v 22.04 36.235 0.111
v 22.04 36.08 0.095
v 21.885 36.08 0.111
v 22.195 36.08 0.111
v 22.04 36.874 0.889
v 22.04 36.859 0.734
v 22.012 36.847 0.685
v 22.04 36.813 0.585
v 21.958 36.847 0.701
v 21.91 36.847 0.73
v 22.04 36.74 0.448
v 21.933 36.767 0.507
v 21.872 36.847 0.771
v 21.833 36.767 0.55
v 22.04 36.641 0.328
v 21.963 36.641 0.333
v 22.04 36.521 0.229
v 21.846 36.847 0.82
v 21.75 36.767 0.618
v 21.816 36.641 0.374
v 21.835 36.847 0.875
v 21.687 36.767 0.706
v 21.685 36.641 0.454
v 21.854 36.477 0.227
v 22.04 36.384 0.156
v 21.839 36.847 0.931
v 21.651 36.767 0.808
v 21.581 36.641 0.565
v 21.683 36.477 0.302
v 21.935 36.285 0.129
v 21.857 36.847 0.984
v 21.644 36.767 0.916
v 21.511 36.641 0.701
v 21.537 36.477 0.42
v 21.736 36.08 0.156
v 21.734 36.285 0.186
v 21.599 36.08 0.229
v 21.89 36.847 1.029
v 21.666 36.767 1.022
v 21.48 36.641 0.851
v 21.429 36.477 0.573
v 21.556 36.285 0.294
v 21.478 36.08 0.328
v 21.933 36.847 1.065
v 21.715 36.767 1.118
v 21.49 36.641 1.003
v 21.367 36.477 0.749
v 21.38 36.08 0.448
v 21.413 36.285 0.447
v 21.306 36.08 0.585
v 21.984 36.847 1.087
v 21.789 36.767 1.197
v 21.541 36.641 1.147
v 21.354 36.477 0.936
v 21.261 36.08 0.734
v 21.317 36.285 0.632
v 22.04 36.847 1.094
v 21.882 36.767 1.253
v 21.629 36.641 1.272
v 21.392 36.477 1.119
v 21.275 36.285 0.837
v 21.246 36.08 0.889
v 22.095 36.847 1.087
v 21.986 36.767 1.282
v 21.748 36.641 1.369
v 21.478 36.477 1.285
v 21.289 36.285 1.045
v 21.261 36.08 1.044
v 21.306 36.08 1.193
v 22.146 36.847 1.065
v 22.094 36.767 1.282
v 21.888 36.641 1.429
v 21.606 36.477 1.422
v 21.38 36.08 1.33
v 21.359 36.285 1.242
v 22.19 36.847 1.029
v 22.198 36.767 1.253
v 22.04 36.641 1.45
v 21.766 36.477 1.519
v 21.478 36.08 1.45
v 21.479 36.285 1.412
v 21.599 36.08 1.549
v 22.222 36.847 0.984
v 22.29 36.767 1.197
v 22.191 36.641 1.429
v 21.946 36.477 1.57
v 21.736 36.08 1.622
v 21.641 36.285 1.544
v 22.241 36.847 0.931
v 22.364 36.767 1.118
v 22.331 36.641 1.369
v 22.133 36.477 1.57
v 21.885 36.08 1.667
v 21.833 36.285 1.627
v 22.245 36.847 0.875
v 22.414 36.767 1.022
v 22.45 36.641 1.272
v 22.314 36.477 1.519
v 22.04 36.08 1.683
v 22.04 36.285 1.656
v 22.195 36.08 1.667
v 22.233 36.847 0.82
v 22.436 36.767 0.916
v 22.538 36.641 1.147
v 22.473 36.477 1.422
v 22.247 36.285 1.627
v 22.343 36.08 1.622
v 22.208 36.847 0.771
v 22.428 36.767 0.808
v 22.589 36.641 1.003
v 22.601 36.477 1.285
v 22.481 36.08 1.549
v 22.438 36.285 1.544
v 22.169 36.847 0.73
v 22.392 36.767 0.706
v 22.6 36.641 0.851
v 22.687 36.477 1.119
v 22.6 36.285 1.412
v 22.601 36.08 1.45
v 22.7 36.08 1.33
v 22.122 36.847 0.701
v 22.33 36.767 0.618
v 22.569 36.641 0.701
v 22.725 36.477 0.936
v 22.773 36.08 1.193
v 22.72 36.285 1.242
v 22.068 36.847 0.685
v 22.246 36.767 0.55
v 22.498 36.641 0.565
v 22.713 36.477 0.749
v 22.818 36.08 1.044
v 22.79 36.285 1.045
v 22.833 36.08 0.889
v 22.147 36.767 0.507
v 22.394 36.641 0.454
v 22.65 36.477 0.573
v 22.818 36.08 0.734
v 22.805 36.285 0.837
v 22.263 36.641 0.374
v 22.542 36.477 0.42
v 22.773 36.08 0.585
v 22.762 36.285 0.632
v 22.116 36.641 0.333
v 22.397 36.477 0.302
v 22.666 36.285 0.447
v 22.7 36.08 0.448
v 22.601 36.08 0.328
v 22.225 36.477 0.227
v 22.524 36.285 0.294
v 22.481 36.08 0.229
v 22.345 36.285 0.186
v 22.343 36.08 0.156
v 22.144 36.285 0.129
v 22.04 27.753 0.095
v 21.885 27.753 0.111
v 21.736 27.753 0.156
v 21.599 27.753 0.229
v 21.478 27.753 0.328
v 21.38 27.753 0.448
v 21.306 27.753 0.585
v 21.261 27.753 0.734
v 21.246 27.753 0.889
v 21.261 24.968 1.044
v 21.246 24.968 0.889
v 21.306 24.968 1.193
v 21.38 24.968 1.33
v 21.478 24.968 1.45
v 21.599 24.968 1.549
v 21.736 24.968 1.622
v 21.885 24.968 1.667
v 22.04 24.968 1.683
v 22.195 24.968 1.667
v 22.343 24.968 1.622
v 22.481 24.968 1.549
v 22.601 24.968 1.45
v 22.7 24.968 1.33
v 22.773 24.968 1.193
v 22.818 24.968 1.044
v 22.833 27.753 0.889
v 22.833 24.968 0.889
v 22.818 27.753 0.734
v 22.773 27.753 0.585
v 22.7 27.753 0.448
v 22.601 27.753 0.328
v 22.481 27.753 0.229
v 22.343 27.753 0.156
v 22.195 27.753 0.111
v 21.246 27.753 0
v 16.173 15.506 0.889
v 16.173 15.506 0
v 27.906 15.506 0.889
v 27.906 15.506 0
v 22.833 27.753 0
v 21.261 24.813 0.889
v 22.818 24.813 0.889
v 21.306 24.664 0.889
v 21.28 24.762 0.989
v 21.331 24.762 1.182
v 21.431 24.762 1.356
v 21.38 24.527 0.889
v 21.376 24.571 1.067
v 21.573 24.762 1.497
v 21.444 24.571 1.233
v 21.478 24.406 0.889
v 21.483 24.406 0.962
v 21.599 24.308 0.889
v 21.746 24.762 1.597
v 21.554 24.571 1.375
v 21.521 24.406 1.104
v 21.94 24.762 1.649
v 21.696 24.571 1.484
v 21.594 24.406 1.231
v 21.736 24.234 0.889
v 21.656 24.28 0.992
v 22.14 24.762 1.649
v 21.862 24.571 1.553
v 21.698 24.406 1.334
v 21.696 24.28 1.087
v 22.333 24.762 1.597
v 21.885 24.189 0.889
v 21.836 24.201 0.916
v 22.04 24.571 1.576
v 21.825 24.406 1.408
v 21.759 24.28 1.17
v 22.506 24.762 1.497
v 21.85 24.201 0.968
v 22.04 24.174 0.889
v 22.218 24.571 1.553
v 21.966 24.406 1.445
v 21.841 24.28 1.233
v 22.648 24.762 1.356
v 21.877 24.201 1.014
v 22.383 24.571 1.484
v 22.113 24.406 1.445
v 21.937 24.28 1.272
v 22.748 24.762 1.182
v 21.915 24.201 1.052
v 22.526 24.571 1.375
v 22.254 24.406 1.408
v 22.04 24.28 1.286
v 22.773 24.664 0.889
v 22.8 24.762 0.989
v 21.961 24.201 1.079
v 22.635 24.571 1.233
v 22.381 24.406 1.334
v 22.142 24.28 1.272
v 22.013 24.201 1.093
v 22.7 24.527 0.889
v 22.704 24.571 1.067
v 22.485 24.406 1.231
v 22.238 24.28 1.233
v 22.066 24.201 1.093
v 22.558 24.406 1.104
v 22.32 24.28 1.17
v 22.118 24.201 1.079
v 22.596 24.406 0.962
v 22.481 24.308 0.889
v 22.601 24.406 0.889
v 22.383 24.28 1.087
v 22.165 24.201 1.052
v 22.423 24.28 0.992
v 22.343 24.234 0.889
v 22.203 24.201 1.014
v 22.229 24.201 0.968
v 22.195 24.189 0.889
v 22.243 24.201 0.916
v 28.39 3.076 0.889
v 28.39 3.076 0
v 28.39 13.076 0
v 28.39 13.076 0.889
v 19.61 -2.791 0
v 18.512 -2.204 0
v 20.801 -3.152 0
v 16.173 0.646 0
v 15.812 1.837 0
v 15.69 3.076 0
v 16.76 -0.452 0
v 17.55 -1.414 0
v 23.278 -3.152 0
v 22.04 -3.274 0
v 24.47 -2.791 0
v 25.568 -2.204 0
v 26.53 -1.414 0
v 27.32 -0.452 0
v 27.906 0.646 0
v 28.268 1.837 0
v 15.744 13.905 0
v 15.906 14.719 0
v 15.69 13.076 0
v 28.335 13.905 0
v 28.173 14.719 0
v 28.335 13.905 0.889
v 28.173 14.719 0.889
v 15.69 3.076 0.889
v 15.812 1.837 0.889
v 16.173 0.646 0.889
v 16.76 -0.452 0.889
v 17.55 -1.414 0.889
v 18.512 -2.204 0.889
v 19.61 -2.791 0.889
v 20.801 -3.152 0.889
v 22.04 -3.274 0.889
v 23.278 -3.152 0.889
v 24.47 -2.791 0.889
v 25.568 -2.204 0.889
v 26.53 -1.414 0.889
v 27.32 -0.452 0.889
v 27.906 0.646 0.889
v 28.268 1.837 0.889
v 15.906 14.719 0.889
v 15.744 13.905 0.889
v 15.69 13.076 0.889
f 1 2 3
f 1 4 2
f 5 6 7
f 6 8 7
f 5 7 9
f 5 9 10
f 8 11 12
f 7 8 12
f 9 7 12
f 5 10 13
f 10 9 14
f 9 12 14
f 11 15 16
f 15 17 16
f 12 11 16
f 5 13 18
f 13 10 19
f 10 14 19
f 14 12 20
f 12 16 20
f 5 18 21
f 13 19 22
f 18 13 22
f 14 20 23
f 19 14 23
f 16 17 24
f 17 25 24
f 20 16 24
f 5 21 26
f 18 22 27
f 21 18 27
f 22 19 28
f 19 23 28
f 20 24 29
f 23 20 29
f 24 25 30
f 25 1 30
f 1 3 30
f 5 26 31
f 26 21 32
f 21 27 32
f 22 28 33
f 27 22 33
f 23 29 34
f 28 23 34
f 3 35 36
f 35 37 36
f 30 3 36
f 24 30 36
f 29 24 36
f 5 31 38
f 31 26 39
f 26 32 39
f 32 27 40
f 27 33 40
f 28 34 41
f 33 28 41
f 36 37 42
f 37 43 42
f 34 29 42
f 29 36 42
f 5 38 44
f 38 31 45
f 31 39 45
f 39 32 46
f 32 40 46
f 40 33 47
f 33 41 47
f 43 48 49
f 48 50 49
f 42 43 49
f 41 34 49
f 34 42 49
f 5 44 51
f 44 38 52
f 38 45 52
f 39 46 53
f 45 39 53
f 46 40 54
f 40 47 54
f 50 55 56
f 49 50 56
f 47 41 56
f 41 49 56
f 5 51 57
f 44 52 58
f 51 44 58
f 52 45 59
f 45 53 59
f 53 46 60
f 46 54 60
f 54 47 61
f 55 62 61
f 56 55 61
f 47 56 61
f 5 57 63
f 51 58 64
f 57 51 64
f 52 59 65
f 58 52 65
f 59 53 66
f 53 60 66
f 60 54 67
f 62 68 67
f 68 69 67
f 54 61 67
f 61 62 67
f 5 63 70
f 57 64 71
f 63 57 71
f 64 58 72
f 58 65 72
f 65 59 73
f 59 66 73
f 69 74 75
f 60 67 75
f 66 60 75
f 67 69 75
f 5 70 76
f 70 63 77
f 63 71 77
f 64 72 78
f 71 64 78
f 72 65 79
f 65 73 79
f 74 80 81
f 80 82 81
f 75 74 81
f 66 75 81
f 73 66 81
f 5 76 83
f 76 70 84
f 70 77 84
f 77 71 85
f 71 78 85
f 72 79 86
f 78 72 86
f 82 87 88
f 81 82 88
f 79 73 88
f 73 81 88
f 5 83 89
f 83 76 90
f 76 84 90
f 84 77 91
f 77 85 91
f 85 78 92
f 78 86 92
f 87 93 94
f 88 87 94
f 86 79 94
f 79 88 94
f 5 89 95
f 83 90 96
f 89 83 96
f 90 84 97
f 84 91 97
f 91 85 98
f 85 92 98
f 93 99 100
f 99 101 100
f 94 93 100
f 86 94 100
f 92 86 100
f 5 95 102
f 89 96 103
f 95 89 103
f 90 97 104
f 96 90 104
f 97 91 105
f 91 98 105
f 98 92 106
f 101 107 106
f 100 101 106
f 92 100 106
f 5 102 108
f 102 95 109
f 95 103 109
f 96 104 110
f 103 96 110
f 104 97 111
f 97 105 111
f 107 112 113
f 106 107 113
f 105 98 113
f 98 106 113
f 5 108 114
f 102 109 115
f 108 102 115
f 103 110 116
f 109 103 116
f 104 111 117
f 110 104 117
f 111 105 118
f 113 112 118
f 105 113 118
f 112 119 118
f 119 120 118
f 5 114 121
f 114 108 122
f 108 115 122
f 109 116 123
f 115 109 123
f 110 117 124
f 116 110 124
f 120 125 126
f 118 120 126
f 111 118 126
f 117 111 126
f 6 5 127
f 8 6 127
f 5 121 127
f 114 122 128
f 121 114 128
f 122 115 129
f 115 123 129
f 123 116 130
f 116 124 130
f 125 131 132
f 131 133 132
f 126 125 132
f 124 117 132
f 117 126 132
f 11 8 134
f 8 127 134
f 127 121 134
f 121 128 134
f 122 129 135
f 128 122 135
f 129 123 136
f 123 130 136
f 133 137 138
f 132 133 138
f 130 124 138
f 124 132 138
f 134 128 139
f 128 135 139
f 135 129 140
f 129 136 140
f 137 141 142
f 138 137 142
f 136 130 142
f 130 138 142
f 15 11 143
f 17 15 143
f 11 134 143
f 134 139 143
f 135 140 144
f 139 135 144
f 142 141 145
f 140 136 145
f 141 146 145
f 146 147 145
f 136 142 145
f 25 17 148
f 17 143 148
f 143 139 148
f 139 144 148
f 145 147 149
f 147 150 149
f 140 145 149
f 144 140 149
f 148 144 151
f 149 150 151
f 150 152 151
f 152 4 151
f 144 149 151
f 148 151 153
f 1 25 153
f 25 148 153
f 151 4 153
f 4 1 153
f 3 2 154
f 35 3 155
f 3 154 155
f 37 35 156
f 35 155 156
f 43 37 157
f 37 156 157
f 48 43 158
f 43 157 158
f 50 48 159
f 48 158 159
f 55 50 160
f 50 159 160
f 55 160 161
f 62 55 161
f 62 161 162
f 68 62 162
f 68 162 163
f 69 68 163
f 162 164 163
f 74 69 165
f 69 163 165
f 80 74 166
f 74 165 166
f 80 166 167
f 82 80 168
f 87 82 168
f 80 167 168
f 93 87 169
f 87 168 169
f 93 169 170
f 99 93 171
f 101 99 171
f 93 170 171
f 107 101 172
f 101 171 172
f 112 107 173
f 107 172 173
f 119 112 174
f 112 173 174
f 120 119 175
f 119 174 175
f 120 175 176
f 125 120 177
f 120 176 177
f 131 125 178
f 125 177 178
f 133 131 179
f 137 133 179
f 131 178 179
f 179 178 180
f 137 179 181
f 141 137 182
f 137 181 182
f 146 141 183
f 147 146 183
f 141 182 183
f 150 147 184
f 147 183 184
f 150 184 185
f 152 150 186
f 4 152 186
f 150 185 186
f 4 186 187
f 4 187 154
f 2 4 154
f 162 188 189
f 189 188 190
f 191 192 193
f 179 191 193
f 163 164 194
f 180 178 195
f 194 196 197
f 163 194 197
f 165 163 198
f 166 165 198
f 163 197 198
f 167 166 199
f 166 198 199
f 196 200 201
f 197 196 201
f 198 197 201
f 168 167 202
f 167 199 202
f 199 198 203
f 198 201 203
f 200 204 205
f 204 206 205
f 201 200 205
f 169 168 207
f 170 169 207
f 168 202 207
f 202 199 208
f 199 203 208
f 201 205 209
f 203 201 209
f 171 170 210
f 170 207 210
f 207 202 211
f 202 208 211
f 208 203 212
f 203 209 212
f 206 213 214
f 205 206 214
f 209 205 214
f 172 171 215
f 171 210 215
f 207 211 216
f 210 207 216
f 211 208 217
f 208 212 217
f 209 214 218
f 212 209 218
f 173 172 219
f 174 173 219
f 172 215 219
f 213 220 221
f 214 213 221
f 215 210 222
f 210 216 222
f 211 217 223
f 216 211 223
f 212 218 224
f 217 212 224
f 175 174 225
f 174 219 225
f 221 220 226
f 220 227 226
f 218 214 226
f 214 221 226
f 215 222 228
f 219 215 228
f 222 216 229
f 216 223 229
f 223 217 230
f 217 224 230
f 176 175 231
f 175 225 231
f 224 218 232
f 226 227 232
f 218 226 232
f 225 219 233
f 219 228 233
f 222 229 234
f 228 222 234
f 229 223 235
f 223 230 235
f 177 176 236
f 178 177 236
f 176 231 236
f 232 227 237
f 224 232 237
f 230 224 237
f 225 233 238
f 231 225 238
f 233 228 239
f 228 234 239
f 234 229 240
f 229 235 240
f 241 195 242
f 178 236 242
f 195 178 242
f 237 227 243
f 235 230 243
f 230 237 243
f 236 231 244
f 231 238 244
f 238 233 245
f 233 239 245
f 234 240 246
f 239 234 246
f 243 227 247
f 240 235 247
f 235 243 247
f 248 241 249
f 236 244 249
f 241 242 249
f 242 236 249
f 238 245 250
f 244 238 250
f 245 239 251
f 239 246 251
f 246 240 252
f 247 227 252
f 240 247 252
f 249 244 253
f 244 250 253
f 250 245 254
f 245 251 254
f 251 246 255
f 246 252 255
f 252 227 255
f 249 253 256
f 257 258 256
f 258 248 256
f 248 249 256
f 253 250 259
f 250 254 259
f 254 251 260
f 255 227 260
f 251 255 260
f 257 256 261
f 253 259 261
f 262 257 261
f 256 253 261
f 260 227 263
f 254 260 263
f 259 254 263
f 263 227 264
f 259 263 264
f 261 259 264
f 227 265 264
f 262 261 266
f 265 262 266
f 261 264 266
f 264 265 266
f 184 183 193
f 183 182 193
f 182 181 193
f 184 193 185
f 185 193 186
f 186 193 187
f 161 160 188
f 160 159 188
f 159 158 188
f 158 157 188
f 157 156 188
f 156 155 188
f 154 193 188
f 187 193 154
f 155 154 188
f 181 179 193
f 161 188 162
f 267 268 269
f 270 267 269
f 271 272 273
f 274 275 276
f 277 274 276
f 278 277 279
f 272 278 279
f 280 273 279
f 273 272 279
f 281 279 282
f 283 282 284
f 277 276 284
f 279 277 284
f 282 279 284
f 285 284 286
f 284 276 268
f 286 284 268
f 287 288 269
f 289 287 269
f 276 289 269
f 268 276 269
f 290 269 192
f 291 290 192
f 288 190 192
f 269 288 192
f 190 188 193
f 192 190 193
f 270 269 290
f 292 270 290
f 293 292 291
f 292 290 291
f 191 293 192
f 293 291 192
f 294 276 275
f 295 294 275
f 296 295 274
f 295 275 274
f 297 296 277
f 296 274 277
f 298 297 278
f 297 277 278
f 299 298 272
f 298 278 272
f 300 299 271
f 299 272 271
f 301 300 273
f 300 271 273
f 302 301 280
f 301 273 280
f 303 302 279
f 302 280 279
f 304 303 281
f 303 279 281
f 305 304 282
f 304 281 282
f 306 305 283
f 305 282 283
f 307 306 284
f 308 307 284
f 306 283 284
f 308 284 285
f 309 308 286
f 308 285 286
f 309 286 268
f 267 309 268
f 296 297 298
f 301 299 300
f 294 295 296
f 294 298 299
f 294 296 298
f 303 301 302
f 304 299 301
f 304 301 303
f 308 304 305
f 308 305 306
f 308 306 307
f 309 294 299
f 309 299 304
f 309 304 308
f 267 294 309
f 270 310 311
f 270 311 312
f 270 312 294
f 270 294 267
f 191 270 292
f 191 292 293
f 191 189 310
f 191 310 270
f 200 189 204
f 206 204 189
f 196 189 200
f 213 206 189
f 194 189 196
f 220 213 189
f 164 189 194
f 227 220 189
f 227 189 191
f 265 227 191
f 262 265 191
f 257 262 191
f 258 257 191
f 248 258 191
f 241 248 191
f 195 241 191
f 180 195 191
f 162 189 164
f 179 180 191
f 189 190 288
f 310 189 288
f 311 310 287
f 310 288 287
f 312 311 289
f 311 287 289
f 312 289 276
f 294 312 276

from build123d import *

# Parameters (mm, degrees)
BOSS_EXTRUDE1_DEPTH = 0.889


with BuildPart() as part:
    # Sketch1 → Boss-Extrude1 (new body)
    with BuildSketch(Plane.XY):
        with BuildLine():
            Line((28.389672555, 3.075908507), (28.389672555, 13.075908507))
            ThreePointArc((28.389672555, 13.075908507), (28.267659086, 14.314732052), (27.906307587, 15.505948303))
            Line((27.906307587, 15.505948303), (22.833422555, 27.752976146))
            Line((22.833422555, 27.752976146), (21.245922555, 27.752976146))
            Line((21.245922555, 27.752976146), (16.173037524, 15.505948303))
            ThreePointArc((16.173037524, 15.505948303), (15.811686025, 14.314732052), (15.689672555, 13.075908507))
            Line((15.689672555, 13.075908507), (15.689672555, 3.075908507))
            ThreePointArc((15.689672555, 3.075908507), (22.039672555, -3.274091493), (28.389672555, 3.075908507))
        make_face()
    extrude(amount=BOSS_EXTRUDE1_DEPTH)

    # Sketch2 → Revolve1 (revolve)
    with BuildSketch(Plane.XY.offset(0.889), mode=Mode.PRIVATE) as revolve1_sk:
        with BuildLine():
            Line((22.039672555, 24.173793785), (22.039672555, 36.873793785))
            ThreePointArc((22.039672555, 36.873793785), (21.478406548, 36.641309793), (21.245922555, 36.080043785))
            Line((21.245922555, 36.080043785), (21.245922555, 24.967543785))
            ThreePointArc((21.245922555, 24.967543785), (21.478406548, 24.406277778), (22.039672555, 24.173793785))
        make_face()
    revolve(revolve1_sk.sketch.rotate(Axis((22.039672555, 24.173793785, 0.889), (0, 1, 0)), 270), axis=Axis((22.039672555, 24.173793785, 0.889), (0, 1, 0)))


solid = part.part
